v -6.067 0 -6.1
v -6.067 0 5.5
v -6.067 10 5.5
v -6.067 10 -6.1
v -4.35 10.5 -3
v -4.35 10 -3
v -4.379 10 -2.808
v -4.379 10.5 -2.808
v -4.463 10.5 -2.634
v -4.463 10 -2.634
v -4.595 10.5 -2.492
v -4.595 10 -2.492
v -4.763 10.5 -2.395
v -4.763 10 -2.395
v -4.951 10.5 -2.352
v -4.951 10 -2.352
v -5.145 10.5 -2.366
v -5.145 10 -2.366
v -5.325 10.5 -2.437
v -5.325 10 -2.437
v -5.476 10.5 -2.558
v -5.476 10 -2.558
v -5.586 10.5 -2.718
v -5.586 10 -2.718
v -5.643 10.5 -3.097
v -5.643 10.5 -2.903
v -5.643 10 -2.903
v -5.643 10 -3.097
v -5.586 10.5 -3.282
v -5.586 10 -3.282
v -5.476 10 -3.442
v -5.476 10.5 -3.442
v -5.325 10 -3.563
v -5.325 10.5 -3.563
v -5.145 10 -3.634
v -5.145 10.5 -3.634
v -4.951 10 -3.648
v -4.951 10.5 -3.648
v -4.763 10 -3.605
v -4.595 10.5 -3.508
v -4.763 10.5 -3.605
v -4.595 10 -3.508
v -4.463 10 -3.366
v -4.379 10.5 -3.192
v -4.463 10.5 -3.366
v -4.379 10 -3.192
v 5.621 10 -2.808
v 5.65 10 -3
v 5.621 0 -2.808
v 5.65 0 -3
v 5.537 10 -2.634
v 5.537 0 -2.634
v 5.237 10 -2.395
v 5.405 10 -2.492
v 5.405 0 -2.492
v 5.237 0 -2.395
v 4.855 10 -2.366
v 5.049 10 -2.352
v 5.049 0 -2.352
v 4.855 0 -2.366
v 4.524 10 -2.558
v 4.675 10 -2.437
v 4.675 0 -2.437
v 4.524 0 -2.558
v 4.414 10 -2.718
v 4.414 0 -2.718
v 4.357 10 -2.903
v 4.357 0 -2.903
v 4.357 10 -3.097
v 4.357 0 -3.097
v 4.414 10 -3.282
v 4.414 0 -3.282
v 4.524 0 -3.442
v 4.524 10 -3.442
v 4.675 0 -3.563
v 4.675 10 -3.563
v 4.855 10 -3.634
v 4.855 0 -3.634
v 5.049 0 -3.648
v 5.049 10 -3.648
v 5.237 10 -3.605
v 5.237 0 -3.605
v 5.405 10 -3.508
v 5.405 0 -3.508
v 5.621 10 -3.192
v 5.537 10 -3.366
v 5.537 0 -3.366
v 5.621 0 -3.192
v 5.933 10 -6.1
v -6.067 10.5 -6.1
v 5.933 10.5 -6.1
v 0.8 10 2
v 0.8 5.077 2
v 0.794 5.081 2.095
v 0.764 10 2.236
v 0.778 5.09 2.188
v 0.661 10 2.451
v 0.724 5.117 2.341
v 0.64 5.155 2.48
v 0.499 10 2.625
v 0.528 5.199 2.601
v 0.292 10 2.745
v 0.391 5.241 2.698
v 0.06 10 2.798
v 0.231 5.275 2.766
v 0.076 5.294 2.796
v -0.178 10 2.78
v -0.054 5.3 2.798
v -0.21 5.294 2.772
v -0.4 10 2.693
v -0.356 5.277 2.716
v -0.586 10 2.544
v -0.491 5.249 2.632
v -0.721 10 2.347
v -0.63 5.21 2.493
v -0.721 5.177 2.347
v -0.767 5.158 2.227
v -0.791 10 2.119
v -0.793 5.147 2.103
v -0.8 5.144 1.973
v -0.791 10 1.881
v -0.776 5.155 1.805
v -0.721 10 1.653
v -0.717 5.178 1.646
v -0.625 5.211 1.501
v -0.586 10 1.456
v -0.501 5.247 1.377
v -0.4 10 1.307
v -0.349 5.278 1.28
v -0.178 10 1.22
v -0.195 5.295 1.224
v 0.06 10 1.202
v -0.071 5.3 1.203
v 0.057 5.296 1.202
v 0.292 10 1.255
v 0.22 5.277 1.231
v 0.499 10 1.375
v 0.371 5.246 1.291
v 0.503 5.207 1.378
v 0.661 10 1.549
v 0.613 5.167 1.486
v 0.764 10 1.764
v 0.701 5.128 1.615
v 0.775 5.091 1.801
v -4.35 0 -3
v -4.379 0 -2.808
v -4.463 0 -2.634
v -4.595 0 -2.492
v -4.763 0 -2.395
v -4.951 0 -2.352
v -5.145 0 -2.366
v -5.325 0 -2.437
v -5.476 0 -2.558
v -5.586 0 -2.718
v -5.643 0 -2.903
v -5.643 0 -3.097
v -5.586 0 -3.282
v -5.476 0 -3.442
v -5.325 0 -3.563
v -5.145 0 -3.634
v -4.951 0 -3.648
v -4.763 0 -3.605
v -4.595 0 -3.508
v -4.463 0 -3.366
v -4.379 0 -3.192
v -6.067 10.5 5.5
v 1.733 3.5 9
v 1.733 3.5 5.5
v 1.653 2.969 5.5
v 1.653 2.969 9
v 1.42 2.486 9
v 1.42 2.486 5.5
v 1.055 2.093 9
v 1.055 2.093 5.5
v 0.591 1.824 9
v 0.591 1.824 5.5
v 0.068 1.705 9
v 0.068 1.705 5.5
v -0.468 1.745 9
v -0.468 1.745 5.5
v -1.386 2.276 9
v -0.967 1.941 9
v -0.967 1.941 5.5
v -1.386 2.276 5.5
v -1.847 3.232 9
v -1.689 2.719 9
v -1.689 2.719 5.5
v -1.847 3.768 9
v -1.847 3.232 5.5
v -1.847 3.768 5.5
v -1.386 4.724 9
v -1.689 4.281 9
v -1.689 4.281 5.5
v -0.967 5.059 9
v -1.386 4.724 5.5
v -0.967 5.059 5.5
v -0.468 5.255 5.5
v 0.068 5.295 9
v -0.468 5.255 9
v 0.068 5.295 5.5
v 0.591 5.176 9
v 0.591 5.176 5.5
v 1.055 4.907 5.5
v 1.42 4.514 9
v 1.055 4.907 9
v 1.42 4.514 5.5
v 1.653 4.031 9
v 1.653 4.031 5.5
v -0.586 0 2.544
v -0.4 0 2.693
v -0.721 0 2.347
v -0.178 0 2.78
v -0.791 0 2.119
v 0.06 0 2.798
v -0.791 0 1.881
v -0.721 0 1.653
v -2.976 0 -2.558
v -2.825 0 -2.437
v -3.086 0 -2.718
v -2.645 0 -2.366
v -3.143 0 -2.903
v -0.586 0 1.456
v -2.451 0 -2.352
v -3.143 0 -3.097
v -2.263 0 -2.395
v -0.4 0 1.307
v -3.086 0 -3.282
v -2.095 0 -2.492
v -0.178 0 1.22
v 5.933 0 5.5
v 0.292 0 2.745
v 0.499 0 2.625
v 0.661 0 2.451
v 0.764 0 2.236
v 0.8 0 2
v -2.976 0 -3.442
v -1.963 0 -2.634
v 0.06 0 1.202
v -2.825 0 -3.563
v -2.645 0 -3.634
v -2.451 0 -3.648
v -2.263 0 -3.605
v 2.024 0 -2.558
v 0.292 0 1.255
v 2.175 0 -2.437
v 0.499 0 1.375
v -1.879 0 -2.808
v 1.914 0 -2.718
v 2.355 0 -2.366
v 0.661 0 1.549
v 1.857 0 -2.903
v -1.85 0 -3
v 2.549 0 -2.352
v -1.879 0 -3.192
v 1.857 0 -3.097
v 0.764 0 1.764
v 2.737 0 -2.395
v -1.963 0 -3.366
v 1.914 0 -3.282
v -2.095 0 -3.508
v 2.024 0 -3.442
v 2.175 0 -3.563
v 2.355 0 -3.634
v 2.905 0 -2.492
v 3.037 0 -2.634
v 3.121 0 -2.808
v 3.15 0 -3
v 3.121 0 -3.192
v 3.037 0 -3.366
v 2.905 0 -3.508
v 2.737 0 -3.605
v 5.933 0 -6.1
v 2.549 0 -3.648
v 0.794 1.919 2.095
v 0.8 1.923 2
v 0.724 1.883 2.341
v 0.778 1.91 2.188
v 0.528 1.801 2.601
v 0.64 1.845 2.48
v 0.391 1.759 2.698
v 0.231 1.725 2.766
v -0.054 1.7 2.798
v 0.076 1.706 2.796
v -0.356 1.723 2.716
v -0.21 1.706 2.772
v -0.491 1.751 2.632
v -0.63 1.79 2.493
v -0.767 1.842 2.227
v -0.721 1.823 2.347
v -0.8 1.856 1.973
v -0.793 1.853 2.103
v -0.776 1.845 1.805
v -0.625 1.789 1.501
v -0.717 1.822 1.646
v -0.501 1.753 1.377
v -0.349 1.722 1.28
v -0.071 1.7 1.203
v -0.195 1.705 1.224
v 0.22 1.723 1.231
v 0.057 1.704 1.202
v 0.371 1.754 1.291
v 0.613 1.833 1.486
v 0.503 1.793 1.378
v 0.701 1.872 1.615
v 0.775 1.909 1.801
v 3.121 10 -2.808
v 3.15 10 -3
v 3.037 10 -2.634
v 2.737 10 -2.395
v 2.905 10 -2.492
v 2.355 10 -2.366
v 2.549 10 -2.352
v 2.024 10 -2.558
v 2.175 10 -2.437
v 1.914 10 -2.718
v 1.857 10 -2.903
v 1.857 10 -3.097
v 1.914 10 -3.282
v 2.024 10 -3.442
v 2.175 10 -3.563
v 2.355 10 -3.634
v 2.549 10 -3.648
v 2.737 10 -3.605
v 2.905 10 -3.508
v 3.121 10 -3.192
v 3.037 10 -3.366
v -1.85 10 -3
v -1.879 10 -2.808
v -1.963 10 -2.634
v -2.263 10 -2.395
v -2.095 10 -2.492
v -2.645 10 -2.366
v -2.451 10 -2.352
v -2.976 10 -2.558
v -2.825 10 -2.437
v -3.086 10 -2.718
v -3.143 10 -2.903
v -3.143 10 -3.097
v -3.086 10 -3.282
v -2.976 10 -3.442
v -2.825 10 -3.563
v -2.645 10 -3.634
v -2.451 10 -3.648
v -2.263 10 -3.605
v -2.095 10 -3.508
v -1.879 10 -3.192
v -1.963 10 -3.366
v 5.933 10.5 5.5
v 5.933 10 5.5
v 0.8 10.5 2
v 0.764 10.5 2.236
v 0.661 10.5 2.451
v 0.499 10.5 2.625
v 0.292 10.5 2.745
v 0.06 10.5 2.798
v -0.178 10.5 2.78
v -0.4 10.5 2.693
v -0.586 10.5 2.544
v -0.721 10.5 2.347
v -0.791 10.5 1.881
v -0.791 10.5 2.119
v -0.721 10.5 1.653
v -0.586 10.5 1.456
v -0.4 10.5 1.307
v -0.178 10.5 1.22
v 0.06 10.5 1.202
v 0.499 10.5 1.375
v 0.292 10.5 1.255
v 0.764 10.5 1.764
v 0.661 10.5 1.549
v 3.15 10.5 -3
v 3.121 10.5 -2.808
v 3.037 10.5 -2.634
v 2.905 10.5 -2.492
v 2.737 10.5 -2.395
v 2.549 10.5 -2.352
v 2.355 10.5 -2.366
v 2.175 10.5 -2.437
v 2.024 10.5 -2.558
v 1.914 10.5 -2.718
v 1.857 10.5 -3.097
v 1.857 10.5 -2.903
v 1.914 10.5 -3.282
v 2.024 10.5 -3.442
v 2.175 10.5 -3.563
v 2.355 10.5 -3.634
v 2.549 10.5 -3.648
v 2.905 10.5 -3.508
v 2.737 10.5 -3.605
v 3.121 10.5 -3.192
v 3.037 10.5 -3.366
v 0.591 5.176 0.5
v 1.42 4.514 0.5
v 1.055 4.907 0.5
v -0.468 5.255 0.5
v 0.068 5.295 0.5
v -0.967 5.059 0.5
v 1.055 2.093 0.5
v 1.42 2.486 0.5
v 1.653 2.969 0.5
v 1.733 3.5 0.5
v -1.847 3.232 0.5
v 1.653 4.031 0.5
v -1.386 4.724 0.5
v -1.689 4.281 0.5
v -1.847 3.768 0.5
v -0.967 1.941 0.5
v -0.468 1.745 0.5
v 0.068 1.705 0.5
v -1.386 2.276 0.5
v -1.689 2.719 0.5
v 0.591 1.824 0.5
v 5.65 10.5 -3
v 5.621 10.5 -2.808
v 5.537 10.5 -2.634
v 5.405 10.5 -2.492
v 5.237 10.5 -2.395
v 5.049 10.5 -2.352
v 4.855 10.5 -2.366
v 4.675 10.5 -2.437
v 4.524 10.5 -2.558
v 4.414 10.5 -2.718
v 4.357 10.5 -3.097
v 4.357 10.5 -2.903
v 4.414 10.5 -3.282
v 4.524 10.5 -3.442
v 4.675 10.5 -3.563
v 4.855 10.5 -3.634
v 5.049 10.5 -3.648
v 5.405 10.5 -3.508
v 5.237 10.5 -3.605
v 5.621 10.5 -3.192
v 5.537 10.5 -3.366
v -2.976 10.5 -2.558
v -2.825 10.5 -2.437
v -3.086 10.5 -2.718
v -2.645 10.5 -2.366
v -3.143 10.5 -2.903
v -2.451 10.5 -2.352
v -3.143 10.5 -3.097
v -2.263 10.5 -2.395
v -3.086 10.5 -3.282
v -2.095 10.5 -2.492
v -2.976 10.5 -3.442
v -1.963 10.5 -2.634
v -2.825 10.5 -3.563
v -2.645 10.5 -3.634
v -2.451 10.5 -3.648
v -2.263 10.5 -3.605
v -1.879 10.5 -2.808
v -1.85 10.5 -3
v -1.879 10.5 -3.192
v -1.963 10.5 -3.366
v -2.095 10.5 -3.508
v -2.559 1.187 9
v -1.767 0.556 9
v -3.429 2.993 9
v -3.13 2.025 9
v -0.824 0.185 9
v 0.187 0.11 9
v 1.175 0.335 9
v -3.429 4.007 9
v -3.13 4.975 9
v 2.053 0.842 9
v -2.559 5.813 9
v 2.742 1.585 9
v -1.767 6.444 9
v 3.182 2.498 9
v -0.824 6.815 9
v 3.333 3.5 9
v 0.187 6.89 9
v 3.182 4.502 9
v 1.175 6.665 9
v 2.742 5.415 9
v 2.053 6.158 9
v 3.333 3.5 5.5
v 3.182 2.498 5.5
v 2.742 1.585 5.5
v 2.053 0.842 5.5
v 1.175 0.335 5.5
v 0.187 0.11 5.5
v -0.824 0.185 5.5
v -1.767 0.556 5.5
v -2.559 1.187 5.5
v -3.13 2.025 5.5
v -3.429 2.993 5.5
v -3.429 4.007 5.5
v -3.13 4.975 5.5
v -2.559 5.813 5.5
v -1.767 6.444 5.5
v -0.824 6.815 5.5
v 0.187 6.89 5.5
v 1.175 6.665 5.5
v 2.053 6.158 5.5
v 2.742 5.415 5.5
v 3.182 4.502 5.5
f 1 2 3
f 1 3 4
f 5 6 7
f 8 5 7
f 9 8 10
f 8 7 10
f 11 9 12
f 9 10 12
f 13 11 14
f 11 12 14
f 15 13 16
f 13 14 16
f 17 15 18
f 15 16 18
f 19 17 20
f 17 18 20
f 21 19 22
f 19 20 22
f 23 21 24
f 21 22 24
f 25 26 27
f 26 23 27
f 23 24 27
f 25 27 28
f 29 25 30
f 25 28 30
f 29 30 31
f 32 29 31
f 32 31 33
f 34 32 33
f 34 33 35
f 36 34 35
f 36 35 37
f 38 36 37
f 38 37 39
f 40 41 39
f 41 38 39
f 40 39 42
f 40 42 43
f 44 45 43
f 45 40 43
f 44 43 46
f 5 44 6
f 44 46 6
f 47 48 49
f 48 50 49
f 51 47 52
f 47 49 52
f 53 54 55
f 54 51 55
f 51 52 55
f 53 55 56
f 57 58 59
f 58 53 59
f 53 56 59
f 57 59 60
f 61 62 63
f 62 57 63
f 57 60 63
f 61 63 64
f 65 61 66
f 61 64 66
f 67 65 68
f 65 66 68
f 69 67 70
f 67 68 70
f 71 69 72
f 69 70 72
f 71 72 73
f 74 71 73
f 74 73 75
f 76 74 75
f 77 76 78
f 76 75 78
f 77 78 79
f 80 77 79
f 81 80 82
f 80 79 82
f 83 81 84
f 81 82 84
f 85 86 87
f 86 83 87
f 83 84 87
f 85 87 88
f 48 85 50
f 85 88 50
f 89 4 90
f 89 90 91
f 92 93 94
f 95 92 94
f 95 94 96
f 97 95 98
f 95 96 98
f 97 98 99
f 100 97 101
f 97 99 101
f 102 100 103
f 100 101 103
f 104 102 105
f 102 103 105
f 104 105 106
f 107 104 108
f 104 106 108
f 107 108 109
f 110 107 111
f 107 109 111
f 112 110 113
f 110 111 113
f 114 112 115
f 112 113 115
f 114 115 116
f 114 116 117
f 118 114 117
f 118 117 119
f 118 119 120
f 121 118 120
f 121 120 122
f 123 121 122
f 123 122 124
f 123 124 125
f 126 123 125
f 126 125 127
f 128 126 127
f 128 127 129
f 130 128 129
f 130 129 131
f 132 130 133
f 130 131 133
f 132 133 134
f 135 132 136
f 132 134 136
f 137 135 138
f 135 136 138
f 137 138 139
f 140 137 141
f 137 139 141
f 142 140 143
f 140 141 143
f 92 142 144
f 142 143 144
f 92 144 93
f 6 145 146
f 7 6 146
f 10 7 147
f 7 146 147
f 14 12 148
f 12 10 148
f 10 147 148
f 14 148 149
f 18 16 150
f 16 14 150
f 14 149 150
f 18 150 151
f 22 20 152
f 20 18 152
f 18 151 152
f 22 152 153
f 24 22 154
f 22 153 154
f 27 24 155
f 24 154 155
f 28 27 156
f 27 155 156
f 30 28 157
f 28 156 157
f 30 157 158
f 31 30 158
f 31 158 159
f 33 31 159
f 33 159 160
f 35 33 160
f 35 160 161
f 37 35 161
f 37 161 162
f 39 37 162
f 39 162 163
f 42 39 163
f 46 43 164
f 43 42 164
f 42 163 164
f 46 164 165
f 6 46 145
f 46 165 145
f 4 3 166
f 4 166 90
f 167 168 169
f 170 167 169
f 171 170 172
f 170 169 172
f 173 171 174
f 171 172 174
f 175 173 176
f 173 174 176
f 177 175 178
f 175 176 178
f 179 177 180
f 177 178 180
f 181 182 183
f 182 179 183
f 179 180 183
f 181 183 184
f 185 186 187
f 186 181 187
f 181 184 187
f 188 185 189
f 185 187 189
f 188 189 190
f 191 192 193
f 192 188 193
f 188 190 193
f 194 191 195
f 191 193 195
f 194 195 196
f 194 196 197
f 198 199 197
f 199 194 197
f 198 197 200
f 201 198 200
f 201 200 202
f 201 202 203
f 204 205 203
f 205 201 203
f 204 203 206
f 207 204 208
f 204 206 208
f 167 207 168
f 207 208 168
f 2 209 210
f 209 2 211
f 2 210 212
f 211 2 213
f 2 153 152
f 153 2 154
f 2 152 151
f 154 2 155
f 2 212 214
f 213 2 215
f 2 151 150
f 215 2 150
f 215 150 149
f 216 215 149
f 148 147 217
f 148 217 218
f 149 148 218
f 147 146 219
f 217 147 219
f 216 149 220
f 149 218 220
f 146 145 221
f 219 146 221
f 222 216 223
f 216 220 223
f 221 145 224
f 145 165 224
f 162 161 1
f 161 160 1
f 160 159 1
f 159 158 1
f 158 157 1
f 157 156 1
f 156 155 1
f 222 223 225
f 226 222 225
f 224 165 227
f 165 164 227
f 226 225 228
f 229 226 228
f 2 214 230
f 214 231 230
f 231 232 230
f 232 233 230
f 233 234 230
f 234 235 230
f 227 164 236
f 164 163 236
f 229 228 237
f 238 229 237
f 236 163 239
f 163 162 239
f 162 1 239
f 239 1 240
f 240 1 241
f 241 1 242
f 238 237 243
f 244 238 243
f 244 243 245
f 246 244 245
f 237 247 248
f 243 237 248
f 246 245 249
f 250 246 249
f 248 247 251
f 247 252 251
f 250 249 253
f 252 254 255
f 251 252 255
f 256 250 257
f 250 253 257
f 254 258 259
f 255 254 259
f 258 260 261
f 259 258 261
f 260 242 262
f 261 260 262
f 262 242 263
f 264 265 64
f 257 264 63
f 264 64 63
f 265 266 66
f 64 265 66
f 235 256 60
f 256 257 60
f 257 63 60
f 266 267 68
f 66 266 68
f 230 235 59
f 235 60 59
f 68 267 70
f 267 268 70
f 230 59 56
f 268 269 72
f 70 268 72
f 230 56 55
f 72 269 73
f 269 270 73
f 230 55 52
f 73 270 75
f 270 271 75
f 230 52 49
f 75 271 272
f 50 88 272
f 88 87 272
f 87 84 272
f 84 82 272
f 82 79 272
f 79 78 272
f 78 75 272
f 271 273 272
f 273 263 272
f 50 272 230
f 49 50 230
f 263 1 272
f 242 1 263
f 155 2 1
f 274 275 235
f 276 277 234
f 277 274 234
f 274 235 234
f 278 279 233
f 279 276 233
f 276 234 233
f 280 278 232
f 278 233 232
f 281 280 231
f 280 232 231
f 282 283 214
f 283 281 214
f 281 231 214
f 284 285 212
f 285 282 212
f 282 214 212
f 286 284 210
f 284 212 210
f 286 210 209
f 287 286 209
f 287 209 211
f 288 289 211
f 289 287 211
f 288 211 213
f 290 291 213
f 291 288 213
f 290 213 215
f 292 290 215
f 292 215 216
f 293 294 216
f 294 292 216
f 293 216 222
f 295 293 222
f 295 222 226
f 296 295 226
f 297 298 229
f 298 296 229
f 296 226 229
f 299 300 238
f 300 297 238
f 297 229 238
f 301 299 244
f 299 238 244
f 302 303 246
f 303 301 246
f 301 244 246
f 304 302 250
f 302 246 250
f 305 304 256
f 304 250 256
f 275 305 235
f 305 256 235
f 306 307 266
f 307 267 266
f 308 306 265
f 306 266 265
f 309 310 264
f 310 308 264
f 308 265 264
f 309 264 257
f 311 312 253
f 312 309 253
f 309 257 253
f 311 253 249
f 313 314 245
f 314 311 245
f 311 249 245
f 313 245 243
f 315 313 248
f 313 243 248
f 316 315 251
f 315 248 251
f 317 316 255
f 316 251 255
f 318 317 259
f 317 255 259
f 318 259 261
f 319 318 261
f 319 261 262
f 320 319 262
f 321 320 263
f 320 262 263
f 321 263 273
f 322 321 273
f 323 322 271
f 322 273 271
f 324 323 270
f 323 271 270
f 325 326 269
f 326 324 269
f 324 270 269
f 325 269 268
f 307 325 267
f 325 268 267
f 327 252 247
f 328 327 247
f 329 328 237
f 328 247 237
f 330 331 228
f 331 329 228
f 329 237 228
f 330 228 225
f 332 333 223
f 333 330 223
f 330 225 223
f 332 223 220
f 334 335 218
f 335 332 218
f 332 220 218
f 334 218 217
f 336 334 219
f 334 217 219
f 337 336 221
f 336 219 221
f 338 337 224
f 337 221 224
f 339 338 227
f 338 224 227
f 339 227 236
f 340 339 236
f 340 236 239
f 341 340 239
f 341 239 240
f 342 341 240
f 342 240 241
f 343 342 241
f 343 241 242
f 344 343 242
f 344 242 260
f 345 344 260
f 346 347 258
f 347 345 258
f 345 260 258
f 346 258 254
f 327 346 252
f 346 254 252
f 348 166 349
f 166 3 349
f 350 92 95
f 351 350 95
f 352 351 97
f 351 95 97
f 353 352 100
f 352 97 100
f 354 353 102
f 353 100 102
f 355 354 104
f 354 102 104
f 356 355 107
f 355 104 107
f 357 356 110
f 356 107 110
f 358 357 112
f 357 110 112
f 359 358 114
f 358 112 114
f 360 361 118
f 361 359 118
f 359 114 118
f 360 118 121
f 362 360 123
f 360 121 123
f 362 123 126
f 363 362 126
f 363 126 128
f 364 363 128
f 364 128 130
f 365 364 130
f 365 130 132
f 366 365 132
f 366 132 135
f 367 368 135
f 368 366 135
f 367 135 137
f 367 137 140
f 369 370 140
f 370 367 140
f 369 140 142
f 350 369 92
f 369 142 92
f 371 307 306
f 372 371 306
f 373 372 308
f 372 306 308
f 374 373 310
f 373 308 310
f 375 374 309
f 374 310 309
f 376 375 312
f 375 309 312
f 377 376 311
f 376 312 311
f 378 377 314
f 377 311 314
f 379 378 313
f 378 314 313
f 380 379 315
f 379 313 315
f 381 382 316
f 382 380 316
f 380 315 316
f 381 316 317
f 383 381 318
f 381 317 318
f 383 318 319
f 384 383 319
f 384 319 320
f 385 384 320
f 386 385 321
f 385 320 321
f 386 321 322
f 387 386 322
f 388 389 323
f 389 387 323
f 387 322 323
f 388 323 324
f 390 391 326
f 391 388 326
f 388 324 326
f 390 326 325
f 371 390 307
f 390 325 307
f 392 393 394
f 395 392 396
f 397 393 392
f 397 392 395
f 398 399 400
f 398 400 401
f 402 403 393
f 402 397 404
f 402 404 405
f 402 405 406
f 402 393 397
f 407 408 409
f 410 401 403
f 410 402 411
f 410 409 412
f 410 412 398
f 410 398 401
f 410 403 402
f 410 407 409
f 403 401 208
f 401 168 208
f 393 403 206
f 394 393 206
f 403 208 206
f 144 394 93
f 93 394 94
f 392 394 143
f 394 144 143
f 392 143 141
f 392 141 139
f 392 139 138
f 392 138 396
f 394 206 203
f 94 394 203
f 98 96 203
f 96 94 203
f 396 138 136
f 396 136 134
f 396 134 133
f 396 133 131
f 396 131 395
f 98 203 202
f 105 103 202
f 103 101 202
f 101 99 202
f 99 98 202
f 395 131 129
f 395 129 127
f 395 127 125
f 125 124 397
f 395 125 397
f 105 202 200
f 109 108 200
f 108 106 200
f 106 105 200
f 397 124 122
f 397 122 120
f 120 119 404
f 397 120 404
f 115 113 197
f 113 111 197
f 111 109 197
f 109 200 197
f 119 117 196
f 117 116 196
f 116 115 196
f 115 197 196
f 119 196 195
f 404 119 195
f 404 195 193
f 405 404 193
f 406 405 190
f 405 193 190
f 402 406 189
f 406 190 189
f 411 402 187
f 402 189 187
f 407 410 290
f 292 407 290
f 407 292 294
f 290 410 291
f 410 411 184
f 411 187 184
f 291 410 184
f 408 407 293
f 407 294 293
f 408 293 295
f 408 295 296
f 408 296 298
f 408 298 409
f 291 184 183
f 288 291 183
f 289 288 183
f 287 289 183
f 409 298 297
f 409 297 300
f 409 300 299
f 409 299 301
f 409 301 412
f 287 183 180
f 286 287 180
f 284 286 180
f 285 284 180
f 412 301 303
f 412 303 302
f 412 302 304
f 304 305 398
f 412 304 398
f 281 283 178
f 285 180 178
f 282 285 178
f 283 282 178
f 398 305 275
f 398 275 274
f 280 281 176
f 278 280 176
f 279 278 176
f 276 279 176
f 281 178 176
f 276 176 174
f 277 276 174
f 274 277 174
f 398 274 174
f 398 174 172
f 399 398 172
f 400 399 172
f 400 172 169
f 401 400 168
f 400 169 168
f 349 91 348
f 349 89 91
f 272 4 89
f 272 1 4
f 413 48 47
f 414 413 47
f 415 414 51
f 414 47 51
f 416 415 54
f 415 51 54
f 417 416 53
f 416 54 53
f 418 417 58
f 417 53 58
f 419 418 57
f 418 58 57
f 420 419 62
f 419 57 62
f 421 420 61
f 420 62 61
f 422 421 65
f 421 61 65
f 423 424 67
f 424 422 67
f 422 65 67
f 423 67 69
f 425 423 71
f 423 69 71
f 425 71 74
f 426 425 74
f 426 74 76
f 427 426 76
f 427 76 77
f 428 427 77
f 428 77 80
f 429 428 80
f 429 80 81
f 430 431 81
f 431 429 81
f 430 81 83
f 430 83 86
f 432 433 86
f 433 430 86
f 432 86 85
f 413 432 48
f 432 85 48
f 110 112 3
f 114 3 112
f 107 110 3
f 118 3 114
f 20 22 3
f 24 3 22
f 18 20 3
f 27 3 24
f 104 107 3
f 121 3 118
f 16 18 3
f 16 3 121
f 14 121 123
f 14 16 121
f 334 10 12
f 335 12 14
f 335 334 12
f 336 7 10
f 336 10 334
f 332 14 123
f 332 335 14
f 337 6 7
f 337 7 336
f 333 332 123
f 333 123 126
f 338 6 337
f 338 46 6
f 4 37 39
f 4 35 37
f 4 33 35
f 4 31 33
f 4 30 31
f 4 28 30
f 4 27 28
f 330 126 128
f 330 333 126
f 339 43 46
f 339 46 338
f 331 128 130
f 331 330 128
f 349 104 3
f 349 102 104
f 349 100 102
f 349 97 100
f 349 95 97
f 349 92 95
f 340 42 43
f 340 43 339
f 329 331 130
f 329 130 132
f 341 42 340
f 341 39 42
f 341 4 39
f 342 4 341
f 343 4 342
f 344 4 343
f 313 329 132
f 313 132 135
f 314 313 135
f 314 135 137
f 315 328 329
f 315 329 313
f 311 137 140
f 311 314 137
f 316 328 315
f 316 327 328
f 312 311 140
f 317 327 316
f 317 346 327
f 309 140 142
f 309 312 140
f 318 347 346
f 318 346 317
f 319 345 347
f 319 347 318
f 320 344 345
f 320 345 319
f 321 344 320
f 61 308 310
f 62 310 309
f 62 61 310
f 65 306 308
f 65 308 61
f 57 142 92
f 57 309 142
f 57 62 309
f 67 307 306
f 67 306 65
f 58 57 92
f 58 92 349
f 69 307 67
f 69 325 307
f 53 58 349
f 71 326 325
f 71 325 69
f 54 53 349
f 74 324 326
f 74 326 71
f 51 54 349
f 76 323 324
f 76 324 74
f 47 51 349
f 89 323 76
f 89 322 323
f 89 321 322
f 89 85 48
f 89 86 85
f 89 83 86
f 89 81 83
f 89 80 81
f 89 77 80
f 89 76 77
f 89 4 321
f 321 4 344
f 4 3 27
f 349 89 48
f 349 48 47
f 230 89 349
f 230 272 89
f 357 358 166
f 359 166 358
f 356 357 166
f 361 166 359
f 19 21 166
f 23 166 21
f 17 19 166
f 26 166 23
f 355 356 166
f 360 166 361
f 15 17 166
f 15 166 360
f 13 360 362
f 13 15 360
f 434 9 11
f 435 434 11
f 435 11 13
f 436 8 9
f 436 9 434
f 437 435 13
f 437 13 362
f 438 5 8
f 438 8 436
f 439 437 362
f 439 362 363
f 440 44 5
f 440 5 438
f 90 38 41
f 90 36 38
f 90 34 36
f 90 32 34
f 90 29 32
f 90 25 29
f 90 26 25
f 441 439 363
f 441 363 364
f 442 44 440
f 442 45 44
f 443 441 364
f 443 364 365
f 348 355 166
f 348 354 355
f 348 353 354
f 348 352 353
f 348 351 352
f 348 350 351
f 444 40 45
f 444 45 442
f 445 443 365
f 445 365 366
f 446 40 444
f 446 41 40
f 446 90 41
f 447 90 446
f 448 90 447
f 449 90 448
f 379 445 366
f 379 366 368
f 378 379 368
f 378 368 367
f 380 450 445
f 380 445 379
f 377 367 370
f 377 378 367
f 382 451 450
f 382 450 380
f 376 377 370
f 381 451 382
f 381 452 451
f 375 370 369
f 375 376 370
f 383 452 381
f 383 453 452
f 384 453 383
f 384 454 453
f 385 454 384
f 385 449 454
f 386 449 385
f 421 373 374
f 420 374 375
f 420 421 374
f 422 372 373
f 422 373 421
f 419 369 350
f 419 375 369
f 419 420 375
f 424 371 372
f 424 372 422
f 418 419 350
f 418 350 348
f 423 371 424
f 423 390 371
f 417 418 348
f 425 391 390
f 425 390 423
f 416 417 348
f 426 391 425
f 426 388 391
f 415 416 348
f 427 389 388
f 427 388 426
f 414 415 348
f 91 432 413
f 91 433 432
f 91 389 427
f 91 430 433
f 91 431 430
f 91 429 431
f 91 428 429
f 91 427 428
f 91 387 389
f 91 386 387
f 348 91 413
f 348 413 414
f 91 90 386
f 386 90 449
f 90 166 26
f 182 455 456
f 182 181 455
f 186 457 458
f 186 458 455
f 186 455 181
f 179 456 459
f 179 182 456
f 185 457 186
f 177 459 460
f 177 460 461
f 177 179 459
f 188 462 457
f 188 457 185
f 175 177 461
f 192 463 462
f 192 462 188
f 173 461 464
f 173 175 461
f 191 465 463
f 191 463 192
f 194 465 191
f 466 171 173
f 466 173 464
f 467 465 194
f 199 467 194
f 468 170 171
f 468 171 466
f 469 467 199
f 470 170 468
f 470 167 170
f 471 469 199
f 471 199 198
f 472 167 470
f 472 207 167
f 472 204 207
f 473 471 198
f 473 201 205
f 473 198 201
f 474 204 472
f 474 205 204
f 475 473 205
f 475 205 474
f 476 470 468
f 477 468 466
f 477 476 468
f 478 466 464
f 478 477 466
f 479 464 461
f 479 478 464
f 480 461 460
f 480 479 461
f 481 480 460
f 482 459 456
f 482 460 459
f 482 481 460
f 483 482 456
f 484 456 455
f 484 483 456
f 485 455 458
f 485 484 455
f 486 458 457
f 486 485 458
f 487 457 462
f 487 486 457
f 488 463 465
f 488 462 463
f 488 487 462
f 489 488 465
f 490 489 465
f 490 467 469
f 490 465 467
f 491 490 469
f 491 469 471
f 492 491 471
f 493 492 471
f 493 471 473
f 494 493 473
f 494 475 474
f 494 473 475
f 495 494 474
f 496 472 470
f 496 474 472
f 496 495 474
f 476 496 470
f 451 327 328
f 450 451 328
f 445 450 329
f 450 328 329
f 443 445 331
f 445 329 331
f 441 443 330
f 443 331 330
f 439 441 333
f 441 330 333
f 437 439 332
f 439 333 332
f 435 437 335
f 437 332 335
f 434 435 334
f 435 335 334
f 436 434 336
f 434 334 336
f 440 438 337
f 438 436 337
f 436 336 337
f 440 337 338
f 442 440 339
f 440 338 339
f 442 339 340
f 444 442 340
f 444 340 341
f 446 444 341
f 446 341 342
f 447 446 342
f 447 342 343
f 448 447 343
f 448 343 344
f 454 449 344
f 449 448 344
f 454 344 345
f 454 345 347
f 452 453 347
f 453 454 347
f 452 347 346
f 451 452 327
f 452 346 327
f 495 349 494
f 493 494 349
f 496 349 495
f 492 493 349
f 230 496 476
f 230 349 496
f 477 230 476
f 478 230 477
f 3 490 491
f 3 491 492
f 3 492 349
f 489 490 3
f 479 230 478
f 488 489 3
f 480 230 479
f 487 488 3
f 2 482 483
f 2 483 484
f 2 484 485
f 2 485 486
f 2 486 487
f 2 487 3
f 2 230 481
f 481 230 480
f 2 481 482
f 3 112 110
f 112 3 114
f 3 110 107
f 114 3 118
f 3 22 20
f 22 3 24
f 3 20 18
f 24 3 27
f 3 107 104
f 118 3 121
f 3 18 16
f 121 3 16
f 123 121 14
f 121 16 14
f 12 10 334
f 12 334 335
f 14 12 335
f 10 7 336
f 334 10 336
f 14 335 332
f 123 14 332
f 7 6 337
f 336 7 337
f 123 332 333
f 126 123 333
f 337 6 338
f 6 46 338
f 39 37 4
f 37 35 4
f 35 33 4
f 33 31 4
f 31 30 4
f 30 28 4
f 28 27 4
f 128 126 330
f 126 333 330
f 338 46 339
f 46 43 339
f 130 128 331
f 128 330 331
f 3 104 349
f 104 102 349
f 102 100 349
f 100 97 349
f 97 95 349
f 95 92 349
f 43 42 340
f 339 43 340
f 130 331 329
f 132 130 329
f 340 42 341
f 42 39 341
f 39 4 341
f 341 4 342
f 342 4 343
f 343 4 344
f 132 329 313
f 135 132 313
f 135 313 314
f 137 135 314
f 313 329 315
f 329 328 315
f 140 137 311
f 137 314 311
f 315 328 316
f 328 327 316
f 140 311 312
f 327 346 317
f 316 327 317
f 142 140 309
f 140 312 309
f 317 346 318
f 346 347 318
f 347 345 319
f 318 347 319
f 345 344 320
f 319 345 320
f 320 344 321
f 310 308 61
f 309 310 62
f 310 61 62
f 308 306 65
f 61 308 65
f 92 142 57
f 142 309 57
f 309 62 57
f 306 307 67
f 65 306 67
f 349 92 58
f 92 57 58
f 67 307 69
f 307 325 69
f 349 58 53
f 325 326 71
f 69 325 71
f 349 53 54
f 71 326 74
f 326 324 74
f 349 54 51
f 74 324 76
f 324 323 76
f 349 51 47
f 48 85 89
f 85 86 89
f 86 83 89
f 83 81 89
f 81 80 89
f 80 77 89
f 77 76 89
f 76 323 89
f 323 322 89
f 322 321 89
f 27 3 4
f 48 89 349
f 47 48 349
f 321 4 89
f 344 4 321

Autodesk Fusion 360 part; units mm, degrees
sketch "Sketch1" plane through (0, 0, 0) normal (0, 1, 0) x (1, 0, 0)
  line L0 (-6.067, 6.1) -> (5.933, 6.1)
  line L1 (5.933, 6.1) -> (5.933, -5.5)
  line L2 (5.933, -5.5) -> (-6.067, -5.5)
  line L3 (-6.067, -5.5) -> (-6.067, 6.1)
  line L4 (-3.467, -5.5) -> (3.433, -5.5)
  line L5 (3.433, -5.5) -> (3.433, -9)
  line L6 (3.433, -9) -> (-3.467, -9)
  line L7 (-3.467, -9) -> (-3.467, -5.5)
  circle A0 centre (5, 3) radius 0.65
  circle A1 centre (5, 3) radius 0.65
  circle A2 centre (2.5, 3) radius 0.65
  circle A3 centre (-2.5, 3) radius 0.65
  circle A4 centre (-5, 3) radius 0.65
  circle A5 centre (0, -2) radius 0.8
  point P0 (5, 3)
  point P1 (0, 3)
  dimension "d1" = 11.6
  dimension "d2" = 12
  dimension "d3" = 3.5
  dimension "d4" = 6.9
  dimension "d5" = 2.6
  dimension "d9" = 1.3
  dimension "d10" = 8.5
  dimension "d14" = 5
  dimension "d15" = 1.3
  dimension "d16" = 1.3
  dimension "d17" = 1.3
  dimension "d18" = 1.3
  dimension "d19" = 1.6
  dimension "d20" = 5
  dimension "d21" = 7
extrude "Extrude1" add sketch "Sketch1" along normal blind 10 contours L0 L1 L2 L3 L4 makes body 1
sketch "Sketch2" plane through (0, 0, 5.5) normal (0, 0, 1) x (1, 0, 0)
  line L0 (-6.067, 0) -> (5.933, 0)
  line L1 (5.933, 0) -> (5.933, 10)
  line L2 (5.933, 10) -> (-6.067, 10)
  line L3 (-6.067, 10) -> (-6.067, 0)
  circle A0 centre (-0.067, 3.5) radius 3.4
  circle A1 centre (-0.067, 3.5) radius 1.8
  dimension "d24" = 6.8
  dimension "d25" = 6
  dimension "d26" = 6.5
  dimension "d27" = 3.6
extrude "Extrude2" add sketch "Sketch2" along normal blind 3.5 contours A0 bodies 1
extrude "Extrude3" cut 1 faces at (-0.4869, 3.3582, 5.5) along direction (0, 0, -1) blind 5 on bodies 1 bodies 1
extrude "Extrude4" add 1 faces at (-3.9395, 10, 1.7161) along direction (0, 1, 0) blind 0.5 separate body on bodies 1 makes body 2
